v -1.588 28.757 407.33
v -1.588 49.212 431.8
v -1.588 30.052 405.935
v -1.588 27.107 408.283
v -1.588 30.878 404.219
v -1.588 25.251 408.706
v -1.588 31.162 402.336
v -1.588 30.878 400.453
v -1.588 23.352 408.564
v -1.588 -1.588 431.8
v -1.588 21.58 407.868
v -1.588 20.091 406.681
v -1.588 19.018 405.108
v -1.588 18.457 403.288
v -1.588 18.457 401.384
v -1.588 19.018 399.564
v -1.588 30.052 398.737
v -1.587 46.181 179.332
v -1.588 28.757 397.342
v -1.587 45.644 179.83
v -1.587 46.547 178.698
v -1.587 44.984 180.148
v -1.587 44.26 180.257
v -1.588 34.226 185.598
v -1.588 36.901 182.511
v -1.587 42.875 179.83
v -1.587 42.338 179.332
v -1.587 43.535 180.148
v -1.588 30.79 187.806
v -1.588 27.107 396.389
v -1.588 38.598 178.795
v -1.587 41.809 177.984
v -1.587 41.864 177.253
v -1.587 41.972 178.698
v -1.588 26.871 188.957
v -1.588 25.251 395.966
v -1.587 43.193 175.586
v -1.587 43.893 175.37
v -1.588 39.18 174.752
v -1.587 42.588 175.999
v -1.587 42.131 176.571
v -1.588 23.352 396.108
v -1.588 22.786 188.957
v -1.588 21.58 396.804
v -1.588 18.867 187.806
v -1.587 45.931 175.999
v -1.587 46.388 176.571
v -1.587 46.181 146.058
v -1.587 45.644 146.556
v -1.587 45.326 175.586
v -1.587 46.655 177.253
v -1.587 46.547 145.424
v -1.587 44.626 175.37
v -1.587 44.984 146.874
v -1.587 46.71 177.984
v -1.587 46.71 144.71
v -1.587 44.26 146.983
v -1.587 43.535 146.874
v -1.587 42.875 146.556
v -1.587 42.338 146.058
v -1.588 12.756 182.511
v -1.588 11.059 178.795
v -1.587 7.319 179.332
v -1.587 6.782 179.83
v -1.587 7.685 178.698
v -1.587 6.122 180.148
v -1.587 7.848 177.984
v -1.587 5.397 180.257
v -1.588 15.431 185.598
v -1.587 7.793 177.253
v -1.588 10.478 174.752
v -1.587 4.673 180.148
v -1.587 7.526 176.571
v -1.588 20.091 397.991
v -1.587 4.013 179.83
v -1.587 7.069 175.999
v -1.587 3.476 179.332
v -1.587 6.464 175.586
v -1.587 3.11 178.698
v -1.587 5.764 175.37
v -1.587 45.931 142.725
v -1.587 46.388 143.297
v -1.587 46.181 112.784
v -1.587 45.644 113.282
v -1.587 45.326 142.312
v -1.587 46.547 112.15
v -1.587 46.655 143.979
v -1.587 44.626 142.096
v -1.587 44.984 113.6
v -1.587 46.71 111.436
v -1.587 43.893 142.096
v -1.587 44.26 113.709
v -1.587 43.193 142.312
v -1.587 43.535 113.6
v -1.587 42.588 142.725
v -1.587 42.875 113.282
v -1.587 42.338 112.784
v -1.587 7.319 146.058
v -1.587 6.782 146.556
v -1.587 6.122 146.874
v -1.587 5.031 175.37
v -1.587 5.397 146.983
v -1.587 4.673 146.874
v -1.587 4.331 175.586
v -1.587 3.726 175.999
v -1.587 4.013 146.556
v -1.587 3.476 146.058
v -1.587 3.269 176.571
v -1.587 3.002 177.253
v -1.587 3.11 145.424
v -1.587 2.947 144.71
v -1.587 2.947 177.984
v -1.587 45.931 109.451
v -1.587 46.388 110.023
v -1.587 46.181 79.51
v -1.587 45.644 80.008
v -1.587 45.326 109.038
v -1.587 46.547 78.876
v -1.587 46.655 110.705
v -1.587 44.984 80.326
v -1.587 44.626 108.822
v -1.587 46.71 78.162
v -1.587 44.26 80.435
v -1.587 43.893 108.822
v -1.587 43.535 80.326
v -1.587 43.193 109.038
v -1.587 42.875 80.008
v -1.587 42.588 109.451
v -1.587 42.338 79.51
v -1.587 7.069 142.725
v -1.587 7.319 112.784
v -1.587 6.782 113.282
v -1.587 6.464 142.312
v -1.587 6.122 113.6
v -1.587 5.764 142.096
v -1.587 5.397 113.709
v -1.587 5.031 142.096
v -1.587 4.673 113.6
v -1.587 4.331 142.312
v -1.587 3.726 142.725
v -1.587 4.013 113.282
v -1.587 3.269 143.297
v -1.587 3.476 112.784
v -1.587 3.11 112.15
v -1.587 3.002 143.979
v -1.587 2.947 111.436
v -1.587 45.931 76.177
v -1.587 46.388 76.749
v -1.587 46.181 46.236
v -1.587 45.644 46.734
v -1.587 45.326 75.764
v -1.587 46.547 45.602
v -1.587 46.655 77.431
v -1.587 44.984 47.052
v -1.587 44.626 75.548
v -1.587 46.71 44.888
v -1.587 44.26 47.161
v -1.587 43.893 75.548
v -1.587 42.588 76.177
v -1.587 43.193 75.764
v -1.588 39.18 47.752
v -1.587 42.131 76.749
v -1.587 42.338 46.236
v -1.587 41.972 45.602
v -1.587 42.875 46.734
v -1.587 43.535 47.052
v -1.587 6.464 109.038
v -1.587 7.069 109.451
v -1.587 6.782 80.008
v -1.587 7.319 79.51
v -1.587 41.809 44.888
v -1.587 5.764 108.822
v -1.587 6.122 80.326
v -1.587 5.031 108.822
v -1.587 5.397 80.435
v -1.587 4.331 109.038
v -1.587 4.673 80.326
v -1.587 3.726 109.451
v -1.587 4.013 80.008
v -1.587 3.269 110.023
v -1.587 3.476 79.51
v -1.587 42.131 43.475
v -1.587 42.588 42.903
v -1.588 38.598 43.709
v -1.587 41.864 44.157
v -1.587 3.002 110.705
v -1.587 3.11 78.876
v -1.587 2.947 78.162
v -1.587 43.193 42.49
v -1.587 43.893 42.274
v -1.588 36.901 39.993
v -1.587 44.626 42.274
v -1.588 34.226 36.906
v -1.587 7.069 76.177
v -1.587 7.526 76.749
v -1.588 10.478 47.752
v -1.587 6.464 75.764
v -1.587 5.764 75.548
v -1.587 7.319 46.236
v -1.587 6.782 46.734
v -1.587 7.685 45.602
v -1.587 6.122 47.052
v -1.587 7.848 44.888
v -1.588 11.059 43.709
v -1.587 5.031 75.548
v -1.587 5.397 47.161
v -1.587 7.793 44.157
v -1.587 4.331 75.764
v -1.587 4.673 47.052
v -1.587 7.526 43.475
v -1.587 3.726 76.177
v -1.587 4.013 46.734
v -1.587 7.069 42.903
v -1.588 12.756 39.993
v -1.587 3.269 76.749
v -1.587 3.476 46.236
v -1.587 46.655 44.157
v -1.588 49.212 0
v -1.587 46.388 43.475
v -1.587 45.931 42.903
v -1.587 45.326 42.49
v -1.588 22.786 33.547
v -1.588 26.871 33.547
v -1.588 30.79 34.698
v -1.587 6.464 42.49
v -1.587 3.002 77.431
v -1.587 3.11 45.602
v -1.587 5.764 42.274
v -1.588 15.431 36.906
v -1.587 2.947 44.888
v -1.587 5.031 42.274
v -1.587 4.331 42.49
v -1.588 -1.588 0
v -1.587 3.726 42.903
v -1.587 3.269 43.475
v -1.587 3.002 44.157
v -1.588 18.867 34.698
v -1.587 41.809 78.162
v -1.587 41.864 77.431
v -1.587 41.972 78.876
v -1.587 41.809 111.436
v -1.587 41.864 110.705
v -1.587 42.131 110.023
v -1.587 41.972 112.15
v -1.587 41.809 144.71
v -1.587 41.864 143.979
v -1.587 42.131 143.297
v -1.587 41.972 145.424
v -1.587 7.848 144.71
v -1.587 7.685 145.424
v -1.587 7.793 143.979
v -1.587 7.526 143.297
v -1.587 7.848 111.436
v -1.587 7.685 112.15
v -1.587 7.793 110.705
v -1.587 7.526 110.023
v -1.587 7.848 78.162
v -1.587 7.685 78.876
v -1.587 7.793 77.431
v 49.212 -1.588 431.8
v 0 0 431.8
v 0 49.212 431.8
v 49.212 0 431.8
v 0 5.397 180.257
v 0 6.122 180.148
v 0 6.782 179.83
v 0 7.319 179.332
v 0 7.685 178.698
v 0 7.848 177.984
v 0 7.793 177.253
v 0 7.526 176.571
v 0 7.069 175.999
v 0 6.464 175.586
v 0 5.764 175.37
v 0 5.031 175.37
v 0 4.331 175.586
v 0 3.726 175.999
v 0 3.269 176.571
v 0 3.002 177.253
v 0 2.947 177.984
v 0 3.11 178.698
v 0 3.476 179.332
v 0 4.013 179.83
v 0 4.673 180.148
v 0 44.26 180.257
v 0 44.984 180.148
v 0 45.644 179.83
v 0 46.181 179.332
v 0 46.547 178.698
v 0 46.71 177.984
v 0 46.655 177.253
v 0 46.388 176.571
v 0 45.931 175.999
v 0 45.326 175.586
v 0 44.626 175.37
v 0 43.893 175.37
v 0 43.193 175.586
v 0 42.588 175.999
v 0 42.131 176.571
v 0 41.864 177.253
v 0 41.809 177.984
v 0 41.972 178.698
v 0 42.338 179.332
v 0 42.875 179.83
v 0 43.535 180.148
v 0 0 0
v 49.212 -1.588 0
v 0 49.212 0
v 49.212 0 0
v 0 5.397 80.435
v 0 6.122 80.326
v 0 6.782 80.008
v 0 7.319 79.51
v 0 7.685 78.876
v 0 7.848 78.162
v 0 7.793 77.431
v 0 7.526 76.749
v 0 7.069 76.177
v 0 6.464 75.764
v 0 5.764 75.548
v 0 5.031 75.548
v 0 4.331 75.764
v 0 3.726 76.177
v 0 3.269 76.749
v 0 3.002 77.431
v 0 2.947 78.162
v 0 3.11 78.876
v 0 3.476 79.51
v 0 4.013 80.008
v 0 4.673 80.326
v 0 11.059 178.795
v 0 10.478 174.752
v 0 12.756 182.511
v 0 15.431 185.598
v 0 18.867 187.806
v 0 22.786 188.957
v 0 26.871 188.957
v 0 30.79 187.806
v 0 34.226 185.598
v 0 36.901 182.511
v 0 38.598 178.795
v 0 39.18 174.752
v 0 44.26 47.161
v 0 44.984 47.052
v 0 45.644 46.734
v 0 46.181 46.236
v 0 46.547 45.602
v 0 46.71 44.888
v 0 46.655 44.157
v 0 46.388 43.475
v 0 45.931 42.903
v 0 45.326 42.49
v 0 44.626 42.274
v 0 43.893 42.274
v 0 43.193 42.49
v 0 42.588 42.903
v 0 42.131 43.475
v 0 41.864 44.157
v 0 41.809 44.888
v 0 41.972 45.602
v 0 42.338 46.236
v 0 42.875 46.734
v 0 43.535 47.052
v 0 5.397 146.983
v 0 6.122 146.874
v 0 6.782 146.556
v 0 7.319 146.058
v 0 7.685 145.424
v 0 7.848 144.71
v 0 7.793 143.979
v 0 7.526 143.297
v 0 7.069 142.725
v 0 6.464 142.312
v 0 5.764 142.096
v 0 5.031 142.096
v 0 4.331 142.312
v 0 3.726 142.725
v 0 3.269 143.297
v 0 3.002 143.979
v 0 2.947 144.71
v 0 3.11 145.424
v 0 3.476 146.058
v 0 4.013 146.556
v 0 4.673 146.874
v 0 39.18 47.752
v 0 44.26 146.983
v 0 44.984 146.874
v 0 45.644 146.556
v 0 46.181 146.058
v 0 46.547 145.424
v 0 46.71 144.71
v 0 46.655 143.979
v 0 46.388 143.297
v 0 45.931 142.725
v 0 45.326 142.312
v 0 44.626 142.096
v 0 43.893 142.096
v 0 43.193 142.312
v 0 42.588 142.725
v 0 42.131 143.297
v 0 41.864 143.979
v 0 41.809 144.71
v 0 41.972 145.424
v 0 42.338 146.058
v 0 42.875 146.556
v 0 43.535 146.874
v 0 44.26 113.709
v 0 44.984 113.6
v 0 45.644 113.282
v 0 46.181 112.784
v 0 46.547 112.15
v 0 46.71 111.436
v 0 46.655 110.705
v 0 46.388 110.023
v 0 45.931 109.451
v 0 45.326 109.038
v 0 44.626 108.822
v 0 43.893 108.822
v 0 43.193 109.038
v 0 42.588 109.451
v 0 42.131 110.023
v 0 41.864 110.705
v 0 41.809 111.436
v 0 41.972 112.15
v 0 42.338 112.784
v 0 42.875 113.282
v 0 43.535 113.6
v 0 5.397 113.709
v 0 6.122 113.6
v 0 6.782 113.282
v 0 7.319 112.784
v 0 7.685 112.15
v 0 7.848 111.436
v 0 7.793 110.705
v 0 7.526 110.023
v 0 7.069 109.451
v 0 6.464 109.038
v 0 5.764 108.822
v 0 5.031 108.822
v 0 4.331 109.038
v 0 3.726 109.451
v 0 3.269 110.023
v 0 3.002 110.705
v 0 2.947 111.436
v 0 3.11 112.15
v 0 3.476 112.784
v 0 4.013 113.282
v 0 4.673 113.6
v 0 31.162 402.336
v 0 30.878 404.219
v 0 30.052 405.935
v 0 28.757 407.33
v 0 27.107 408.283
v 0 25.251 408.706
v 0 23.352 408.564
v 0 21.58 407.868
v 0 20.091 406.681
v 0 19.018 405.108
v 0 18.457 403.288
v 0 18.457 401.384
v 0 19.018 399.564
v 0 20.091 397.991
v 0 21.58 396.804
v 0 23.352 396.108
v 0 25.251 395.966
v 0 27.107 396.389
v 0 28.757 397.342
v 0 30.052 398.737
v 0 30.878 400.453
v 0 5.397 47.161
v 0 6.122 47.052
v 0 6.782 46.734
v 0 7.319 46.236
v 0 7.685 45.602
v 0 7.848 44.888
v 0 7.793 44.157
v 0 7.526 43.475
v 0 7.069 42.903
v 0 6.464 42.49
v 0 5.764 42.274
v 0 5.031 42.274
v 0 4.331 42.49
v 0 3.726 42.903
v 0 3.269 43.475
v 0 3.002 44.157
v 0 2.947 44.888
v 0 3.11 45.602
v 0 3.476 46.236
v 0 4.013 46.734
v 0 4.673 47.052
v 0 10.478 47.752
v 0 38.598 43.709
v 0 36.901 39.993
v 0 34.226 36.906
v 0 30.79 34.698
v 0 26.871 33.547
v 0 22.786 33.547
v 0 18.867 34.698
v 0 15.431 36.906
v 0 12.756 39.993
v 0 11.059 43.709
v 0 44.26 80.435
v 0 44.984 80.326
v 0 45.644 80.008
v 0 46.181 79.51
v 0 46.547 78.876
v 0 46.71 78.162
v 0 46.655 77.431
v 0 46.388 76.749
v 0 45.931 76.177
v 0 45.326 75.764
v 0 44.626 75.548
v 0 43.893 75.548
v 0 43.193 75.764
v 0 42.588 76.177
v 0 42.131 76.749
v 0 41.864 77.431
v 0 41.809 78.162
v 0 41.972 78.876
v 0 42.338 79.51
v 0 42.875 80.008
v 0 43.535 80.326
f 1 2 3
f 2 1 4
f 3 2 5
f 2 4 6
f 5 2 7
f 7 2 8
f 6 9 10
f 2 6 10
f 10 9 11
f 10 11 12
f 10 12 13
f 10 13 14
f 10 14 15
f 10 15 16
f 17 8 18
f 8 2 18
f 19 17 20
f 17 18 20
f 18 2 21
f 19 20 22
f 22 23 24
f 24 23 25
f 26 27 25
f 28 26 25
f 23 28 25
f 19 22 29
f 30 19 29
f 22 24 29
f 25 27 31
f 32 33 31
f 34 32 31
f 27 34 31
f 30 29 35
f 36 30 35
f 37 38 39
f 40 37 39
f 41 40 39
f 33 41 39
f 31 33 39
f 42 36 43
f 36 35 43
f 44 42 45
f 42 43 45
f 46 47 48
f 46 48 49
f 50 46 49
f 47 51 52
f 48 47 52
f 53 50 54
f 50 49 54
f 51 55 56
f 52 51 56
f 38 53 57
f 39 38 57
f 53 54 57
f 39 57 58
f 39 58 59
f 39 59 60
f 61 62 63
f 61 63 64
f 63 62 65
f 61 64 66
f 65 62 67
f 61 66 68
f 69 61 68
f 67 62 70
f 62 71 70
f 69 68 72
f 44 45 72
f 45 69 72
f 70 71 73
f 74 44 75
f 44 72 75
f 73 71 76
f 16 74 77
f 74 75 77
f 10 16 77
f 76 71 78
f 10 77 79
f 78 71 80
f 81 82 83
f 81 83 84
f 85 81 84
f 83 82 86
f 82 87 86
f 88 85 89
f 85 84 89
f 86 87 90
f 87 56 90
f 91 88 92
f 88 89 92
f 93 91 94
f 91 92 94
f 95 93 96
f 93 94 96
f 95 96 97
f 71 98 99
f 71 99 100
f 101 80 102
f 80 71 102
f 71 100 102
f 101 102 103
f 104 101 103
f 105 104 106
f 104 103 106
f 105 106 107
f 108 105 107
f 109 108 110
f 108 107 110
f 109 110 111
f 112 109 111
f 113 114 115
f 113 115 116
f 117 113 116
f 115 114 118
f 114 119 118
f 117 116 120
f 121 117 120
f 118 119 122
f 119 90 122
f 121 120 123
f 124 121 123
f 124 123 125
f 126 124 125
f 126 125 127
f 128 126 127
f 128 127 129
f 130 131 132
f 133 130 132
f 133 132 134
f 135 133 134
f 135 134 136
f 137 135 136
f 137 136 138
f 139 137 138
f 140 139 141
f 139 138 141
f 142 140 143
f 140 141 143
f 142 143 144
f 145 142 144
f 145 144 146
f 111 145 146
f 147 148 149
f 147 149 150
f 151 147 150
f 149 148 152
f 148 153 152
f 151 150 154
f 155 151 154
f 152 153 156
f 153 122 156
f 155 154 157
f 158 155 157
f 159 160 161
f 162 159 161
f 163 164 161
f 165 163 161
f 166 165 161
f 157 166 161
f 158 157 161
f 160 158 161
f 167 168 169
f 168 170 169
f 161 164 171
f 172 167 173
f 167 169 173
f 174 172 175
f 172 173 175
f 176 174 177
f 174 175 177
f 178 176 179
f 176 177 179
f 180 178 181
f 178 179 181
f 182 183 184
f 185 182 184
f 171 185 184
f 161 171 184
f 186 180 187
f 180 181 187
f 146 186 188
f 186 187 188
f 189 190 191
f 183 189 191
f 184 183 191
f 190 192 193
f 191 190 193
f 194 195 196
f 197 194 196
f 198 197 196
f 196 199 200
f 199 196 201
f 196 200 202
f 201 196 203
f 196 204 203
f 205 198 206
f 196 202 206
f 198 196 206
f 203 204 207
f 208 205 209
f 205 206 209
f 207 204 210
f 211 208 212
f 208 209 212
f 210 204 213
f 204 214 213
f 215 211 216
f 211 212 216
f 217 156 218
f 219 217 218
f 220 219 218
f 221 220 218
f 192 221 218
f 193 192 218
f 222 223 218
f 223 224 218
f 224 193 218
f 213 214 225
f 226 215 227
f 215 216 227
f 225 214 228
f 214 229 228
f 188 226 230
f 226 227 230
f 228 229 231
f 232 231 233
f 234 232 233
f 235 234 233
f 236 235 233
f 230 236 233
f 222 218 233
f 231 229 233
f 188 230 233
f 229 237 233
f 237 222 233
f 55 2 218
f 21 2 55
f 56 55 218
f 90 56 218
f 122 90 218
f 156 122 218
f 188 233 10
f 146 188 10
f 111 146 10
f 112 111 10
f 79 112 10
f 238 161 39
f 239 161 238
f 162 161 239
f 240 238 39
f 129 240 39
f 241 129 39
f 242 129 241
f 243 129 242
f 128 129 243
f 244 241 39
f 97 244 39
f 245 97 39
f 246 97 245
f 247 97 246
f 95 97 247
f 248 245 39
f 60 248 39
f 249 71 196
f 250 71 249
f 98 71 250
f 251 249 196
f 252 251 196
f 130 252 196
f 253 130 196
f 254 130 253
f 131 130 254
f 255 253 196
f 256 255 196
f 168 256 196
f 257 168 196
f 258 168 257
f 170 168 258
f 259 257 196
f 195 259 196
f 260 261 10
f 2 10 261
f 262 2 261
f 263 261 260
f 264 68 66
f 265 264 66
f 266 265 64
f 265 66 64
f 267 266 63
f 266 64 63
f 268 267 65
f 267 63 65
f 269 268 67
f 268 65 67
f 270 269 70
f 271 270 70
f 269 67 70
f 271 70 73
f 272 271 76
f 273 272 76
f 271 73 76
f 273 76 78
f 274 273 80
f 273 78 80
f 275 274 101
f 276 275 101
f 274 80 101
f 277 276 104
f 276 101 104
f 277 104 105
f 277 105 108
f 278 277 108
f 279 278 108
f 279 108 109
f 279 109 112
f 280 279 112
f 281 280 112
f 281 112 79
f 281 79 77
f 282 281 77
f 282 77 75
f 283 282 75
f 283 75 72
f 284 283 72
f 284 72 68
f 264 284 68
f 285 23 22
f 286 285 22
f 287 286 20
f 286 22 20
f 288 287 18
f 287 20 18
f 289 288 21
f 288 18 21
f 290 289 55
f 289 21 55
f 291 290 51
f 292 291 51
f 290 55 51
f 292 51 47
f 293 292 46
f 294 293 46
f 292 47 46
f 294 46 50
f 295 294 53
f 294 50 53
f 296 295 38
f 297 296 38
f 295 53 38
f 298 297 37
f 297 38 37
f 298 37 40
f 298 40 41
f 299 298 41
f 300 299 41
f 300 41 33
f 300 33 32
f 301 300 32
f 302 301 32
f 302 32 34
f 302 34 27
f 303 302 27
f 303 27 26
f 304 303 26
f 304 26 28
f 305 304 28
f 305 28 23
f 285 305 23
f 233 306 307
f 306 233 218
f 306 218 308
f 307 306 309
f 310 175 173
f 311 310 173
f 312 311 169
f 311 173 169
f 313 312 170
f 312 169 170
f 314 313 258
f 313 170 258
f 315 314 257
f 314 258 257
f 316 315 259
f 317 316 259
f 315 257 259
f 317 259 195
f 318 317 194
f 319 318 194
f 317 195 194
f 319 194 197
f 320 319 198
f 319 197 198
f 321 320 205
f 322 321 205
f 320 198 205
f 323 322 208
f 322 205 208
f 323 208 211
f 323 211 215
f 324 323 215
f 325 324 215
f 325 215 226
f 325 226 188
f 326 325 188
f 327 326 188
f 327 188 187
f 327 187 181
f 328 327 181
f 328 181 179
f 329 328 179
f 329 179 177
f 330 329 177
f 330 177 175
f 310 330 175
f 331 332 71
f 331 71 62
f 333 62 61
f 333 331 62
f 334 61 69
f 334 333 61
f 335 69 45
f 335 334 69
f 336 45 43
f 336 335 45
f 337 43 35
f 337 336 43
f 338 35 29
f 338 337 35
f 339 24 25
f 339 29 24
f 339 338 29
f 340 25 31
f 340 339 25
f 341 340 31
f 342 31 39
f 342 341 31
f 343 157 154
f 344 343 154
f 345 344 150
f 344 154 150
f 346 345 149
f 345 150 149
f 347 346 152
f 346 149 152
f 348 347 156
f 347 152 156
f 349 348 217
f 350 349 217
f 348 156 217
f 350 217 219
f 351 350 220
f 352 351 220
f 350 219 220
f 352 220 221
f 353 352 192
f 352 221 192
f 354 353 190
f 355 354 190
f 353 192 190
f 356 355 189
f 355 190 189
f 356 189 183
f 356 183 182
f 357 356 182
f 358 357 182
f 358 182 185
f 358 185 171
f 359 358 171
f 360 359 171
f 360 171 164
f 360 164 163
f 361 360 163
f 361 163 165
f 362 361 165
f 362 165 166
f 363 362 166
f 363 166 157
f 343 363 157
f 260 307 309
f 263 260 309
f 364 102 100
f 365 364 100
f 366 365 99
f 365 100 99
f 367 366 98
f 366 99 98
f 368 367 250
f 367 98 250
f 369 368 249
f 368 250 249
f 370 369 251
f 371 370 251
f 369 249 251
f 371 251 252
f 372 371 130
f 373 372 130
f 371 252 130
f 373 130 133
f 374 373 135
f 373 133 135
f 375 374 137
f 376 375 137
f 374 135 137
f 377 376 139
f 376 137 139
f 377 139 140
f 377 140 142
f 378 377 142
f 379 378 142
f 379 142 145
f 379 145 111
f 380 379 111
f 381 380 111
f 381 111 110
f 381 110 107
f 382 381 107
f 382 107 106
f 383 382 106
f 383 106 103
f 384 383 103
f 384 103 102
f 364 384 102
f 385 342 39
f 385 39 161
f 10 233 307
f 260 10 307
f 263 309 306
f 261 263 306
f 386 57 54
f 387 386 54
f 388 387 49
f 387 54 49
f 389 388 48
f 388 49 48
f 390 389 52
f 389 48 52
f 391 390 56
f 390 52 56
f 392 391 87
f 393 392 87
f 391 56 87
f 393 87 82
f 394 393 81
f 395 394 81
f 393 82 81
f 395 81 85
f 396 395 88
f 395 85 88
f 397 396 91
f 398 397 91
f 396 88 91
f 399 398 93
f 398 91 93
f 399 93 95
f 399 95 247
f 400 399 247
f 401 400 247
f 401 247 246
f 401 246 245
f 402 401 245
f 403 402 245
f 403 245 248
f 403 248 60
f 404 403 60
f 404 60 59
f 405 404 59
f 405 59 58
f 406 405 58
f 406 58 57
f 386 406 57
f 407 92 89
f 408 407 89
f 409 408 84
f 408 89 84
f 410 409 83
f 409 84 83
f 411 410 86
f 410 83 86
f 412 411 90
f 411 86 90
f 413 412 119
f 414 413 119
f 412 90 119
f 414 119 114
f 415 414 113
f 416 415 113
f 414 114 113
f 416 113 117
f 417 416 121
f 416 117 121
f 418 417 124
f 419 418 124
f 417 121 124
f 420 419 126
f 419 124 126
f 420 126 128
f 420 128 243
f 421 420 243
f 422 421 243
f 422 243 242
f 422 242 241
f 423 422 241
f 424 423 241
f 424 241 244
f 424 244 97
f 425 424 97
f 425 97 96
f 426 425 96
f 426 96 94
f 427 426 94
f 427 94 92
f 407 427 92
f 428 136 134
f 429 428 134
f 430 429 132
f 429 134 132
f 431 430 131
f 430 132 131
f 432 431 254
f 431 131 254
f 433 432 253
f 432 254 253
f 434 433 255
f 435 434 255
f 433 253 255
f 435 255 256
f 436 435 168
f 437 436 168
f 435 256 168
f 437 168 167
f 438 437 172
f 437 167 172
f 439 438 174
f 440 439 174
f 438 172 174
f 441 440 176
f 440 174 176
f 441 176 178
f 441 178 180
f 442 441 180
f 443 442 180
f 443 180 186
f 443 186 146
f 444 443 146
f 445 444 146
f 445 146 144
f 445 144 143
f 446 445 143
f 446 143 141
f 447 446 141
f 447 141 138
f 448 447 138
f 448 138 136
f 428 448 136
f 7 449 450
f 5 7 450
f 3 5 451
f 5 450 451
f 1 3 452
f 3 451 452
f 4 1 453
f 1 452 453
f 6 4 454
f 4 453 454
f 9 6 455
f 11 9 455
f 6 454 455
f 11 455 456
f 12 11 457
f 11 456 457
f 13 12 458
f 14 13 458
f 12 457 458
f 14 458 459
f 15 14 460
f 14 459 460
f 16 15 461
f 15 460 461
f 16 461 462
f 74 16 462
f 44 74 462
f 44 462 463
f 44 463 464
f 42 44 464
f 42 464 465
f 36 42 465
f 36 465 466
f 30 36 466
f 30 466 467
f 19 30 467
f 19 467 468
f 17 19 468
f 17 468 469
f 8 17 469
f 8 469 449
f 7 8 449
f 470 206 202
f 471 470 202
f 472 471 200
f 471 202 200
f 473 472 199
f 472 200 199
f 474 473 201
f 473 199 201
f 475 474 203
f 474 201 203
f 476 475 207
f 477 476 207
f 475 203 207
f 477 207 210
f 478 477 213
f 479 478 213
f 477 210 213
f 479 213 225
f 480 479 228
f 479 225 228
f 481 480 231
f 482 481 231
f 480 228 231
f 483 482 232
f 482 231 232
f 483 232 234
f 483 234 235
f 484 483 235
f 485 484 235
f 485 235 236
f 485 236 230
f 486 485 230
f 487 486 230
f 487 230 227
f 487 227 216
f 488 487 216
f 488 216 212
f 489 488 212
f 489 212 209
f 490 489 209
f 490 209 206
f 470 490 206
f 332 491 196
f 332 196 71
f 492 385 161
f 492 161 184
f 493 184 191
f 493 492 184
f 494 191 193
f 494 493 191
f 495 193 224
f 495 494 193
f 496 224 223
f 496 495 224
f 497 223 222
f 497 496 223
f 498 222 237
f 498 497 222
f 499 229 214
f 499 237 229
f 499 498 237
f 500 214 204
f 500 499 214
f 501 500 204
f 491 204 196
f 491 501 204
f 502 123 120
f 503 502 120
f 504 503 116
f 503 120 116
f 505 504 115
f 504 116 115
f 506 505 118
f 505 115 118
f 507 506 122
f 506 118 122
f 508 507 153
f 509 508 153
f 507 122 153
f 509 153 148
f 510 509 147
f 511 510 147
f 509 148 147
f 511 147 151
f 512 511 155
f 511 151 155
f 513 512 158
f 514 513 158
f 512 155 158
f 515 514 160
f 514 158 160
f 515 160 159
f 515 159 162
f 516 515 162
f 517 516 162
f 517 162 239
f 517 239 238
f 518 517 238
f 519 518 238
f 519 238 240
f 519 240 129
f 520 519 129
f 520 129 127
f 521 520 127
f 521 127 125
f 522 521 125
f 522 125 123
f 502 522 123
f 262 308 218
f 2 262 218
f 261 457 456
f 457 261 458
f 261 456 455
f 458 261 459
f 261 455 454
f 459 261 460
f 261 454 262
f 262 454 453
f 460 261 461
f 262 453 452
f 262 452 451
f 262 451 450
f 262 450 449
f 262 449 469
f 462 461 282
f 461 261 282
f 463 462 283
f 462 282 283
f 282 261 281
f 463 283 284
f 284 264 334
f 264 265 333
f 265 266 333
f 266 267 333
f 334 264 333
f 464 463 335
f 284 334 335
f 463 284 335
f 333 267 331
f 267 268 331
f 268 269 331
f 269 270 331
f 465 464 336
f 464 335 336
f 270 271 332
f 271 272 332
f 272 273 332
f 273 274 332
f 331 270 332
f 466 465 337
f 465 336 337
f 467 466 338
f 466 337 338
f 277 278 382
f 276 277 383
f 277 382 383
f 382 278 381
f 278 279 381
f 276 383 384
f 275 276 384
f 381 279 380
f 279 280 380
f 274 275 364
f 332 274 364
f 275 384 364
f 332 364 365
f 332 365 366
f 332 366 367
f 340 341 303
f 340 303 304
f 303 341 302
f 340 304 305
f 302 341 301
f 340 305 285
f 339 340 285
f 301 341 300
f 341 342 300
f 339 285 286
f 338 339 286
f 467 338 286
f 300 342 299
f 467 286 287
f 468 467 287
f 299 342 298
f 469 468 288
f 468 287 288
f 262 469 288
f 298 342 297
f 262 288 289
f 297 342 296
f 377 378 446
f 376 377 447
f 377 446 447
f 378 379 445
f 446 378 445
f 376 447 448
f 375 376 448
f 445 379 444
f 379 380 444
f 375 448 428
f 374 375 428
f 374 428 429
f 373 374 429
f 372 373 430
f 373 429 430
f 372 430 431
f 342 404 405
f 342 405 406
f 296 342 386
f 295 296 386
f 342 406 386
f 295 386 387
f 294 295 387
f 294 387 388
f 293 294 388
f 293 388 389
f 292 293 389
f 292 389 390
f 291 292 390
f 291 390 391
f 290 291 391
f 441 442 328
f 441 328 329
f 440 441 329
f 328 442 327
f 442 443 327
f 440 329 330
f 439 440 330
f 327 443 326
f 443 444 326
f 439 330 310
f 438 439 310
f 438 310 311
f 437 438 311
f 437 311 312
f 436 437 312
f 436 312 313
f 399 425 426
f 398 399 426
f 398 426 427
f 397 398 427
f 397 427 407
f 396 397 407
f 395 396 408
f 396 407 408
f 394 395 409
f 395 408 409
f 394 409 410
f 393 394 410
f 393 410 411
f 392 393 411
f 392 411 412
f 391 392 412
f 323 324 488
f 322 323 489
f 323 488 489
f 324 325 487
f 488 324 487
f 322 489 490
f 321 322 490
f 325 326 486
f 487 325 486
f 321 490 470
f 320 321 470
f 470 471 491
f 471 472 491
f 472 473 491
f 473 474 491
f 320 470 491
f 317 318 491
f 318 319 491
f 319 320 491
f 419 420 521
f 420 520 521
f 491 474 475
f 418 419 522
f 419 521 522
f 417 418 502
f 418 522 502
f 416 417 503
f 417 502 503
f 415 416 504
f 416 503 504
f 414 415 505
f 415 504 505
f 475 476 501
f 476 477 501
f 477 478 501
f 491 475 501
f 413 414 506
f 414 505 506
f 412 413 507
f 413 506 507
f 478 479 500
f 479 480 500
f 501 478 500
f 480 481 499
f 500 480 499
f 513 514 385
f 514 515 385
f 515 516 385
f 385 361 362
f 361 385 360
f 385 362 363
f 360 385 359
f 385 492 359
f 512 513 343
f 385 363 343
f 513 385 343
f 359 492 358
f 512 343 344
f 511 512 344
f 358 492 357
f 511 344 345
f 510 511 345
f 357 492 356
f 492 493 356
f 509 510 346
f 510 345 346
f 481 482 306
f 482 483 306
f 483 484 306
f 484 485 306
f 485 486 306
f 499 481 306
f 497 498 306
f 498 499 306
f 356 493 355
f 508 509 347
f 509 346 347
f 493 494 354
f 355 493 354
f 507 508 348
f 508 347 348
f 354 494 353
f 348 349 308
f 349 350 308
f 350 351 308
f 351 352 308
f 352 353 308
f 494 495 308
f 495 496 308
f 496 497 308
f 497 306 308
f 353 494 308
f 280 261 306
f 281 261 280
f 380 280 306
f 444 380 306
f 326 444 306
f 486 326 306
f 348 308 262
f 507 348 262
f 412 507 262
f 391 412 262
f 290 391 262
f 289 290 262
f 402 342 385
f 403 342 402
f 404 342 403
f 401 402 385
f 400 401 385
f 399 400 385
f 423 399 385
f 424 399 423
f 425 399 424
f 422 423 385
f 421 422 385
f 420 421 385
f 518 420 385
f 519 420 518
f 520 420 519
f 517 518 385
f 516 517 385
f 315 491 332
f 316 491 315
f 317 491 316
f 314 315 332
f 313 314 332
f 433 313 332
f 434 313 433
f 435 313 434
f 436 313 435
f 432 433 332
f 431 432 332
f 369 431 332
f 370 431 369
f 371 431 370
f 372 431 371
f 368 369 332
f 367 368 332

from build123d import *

# Parameters (mm, degrees)
BOSS_EXTRUDE2_DEPTH          = 431.8
CUT_EXTRUDE3_DEPTH           = 127
SKETCH7_R                    = 6.3881
CUT_EXTRUDE4_DEPTH           = 438.372816156
F_10_0_1935_DIAMETER_HOLE3_D = 4.9149


with BuildPart() as part:
    # Sketch3 → Boss-Extrude2 (new body)
    with BuildSketch(Plane.XY):
        Polygon((0, 0), (0, 49.2125), (-1.5875, 49.2125), (-1.5875, -1.5875), (49.2125, -1.5875), (49.2125, 0), align=None)
    extrude(amount=BOSS_EXTRUDE2_DEPTH)

    # Sketch6 → Cut-Extrude3 (cut)
    with BuildSketch(Plane(origin=(0, 0, 0), x_dir=(0, 0, -1), z_dir=(1, 0, 0))):
        with BuildLine():
            Line((-174.752, 39.1795), (-47.752, 39.1795))
            ThreePointArc((-47.752, 39.1795), (-33.401, 24.8285), (-47.752, 10.4775))
            Line((-47.752, 10.4775), (-174.752, 10.4775))
            ThreePointArc((-174.752, 10.4775), (-189.103, 24.8285), (-174.752, 39.1795))
        make_face()
    extrude(amount=-CUT_EXTRUDE3_DEPTH, mode=Mode.SUBTRACT)

    # Sketch7 → Cut-Extrude4 (cut, through all)
    with BuildSketch(Plane(origin=(0, 0, 0), x_dir=(0, 0, -1), z_dir=(1, 0, 0))):
        with Locations(Location((-402.336, 24.773594829, 0), (0, 0, 90))):
            Circle(SKETCH7_R)
    extrude(amount=-CUT_EXTRUDE4_DEPTH, mode=Mode.SUBTRACT)

    # #10 (0.1935) Diameter Hole3 (through all)
    with Locations(Plane(origin=(0, 0, 0), x_dir=(0, 0, -1), z_dir=(1, 0, 0))):
        with Locations((-177.8, 44.2595), (-144.526, 44.2595), (-111.252, 44.2595), (-177.8, 5.3975), (-144.526, 5.3975), (-111.252, 5.3975), (-77.978, 44.2595), (-44.704, 44.2595), (-44.704, 5.3975), (-77.978, 5.3975)):
            Hole(F_10_0_1935_DIAMETER_HOLE3_D / 2)


solid = part.part
